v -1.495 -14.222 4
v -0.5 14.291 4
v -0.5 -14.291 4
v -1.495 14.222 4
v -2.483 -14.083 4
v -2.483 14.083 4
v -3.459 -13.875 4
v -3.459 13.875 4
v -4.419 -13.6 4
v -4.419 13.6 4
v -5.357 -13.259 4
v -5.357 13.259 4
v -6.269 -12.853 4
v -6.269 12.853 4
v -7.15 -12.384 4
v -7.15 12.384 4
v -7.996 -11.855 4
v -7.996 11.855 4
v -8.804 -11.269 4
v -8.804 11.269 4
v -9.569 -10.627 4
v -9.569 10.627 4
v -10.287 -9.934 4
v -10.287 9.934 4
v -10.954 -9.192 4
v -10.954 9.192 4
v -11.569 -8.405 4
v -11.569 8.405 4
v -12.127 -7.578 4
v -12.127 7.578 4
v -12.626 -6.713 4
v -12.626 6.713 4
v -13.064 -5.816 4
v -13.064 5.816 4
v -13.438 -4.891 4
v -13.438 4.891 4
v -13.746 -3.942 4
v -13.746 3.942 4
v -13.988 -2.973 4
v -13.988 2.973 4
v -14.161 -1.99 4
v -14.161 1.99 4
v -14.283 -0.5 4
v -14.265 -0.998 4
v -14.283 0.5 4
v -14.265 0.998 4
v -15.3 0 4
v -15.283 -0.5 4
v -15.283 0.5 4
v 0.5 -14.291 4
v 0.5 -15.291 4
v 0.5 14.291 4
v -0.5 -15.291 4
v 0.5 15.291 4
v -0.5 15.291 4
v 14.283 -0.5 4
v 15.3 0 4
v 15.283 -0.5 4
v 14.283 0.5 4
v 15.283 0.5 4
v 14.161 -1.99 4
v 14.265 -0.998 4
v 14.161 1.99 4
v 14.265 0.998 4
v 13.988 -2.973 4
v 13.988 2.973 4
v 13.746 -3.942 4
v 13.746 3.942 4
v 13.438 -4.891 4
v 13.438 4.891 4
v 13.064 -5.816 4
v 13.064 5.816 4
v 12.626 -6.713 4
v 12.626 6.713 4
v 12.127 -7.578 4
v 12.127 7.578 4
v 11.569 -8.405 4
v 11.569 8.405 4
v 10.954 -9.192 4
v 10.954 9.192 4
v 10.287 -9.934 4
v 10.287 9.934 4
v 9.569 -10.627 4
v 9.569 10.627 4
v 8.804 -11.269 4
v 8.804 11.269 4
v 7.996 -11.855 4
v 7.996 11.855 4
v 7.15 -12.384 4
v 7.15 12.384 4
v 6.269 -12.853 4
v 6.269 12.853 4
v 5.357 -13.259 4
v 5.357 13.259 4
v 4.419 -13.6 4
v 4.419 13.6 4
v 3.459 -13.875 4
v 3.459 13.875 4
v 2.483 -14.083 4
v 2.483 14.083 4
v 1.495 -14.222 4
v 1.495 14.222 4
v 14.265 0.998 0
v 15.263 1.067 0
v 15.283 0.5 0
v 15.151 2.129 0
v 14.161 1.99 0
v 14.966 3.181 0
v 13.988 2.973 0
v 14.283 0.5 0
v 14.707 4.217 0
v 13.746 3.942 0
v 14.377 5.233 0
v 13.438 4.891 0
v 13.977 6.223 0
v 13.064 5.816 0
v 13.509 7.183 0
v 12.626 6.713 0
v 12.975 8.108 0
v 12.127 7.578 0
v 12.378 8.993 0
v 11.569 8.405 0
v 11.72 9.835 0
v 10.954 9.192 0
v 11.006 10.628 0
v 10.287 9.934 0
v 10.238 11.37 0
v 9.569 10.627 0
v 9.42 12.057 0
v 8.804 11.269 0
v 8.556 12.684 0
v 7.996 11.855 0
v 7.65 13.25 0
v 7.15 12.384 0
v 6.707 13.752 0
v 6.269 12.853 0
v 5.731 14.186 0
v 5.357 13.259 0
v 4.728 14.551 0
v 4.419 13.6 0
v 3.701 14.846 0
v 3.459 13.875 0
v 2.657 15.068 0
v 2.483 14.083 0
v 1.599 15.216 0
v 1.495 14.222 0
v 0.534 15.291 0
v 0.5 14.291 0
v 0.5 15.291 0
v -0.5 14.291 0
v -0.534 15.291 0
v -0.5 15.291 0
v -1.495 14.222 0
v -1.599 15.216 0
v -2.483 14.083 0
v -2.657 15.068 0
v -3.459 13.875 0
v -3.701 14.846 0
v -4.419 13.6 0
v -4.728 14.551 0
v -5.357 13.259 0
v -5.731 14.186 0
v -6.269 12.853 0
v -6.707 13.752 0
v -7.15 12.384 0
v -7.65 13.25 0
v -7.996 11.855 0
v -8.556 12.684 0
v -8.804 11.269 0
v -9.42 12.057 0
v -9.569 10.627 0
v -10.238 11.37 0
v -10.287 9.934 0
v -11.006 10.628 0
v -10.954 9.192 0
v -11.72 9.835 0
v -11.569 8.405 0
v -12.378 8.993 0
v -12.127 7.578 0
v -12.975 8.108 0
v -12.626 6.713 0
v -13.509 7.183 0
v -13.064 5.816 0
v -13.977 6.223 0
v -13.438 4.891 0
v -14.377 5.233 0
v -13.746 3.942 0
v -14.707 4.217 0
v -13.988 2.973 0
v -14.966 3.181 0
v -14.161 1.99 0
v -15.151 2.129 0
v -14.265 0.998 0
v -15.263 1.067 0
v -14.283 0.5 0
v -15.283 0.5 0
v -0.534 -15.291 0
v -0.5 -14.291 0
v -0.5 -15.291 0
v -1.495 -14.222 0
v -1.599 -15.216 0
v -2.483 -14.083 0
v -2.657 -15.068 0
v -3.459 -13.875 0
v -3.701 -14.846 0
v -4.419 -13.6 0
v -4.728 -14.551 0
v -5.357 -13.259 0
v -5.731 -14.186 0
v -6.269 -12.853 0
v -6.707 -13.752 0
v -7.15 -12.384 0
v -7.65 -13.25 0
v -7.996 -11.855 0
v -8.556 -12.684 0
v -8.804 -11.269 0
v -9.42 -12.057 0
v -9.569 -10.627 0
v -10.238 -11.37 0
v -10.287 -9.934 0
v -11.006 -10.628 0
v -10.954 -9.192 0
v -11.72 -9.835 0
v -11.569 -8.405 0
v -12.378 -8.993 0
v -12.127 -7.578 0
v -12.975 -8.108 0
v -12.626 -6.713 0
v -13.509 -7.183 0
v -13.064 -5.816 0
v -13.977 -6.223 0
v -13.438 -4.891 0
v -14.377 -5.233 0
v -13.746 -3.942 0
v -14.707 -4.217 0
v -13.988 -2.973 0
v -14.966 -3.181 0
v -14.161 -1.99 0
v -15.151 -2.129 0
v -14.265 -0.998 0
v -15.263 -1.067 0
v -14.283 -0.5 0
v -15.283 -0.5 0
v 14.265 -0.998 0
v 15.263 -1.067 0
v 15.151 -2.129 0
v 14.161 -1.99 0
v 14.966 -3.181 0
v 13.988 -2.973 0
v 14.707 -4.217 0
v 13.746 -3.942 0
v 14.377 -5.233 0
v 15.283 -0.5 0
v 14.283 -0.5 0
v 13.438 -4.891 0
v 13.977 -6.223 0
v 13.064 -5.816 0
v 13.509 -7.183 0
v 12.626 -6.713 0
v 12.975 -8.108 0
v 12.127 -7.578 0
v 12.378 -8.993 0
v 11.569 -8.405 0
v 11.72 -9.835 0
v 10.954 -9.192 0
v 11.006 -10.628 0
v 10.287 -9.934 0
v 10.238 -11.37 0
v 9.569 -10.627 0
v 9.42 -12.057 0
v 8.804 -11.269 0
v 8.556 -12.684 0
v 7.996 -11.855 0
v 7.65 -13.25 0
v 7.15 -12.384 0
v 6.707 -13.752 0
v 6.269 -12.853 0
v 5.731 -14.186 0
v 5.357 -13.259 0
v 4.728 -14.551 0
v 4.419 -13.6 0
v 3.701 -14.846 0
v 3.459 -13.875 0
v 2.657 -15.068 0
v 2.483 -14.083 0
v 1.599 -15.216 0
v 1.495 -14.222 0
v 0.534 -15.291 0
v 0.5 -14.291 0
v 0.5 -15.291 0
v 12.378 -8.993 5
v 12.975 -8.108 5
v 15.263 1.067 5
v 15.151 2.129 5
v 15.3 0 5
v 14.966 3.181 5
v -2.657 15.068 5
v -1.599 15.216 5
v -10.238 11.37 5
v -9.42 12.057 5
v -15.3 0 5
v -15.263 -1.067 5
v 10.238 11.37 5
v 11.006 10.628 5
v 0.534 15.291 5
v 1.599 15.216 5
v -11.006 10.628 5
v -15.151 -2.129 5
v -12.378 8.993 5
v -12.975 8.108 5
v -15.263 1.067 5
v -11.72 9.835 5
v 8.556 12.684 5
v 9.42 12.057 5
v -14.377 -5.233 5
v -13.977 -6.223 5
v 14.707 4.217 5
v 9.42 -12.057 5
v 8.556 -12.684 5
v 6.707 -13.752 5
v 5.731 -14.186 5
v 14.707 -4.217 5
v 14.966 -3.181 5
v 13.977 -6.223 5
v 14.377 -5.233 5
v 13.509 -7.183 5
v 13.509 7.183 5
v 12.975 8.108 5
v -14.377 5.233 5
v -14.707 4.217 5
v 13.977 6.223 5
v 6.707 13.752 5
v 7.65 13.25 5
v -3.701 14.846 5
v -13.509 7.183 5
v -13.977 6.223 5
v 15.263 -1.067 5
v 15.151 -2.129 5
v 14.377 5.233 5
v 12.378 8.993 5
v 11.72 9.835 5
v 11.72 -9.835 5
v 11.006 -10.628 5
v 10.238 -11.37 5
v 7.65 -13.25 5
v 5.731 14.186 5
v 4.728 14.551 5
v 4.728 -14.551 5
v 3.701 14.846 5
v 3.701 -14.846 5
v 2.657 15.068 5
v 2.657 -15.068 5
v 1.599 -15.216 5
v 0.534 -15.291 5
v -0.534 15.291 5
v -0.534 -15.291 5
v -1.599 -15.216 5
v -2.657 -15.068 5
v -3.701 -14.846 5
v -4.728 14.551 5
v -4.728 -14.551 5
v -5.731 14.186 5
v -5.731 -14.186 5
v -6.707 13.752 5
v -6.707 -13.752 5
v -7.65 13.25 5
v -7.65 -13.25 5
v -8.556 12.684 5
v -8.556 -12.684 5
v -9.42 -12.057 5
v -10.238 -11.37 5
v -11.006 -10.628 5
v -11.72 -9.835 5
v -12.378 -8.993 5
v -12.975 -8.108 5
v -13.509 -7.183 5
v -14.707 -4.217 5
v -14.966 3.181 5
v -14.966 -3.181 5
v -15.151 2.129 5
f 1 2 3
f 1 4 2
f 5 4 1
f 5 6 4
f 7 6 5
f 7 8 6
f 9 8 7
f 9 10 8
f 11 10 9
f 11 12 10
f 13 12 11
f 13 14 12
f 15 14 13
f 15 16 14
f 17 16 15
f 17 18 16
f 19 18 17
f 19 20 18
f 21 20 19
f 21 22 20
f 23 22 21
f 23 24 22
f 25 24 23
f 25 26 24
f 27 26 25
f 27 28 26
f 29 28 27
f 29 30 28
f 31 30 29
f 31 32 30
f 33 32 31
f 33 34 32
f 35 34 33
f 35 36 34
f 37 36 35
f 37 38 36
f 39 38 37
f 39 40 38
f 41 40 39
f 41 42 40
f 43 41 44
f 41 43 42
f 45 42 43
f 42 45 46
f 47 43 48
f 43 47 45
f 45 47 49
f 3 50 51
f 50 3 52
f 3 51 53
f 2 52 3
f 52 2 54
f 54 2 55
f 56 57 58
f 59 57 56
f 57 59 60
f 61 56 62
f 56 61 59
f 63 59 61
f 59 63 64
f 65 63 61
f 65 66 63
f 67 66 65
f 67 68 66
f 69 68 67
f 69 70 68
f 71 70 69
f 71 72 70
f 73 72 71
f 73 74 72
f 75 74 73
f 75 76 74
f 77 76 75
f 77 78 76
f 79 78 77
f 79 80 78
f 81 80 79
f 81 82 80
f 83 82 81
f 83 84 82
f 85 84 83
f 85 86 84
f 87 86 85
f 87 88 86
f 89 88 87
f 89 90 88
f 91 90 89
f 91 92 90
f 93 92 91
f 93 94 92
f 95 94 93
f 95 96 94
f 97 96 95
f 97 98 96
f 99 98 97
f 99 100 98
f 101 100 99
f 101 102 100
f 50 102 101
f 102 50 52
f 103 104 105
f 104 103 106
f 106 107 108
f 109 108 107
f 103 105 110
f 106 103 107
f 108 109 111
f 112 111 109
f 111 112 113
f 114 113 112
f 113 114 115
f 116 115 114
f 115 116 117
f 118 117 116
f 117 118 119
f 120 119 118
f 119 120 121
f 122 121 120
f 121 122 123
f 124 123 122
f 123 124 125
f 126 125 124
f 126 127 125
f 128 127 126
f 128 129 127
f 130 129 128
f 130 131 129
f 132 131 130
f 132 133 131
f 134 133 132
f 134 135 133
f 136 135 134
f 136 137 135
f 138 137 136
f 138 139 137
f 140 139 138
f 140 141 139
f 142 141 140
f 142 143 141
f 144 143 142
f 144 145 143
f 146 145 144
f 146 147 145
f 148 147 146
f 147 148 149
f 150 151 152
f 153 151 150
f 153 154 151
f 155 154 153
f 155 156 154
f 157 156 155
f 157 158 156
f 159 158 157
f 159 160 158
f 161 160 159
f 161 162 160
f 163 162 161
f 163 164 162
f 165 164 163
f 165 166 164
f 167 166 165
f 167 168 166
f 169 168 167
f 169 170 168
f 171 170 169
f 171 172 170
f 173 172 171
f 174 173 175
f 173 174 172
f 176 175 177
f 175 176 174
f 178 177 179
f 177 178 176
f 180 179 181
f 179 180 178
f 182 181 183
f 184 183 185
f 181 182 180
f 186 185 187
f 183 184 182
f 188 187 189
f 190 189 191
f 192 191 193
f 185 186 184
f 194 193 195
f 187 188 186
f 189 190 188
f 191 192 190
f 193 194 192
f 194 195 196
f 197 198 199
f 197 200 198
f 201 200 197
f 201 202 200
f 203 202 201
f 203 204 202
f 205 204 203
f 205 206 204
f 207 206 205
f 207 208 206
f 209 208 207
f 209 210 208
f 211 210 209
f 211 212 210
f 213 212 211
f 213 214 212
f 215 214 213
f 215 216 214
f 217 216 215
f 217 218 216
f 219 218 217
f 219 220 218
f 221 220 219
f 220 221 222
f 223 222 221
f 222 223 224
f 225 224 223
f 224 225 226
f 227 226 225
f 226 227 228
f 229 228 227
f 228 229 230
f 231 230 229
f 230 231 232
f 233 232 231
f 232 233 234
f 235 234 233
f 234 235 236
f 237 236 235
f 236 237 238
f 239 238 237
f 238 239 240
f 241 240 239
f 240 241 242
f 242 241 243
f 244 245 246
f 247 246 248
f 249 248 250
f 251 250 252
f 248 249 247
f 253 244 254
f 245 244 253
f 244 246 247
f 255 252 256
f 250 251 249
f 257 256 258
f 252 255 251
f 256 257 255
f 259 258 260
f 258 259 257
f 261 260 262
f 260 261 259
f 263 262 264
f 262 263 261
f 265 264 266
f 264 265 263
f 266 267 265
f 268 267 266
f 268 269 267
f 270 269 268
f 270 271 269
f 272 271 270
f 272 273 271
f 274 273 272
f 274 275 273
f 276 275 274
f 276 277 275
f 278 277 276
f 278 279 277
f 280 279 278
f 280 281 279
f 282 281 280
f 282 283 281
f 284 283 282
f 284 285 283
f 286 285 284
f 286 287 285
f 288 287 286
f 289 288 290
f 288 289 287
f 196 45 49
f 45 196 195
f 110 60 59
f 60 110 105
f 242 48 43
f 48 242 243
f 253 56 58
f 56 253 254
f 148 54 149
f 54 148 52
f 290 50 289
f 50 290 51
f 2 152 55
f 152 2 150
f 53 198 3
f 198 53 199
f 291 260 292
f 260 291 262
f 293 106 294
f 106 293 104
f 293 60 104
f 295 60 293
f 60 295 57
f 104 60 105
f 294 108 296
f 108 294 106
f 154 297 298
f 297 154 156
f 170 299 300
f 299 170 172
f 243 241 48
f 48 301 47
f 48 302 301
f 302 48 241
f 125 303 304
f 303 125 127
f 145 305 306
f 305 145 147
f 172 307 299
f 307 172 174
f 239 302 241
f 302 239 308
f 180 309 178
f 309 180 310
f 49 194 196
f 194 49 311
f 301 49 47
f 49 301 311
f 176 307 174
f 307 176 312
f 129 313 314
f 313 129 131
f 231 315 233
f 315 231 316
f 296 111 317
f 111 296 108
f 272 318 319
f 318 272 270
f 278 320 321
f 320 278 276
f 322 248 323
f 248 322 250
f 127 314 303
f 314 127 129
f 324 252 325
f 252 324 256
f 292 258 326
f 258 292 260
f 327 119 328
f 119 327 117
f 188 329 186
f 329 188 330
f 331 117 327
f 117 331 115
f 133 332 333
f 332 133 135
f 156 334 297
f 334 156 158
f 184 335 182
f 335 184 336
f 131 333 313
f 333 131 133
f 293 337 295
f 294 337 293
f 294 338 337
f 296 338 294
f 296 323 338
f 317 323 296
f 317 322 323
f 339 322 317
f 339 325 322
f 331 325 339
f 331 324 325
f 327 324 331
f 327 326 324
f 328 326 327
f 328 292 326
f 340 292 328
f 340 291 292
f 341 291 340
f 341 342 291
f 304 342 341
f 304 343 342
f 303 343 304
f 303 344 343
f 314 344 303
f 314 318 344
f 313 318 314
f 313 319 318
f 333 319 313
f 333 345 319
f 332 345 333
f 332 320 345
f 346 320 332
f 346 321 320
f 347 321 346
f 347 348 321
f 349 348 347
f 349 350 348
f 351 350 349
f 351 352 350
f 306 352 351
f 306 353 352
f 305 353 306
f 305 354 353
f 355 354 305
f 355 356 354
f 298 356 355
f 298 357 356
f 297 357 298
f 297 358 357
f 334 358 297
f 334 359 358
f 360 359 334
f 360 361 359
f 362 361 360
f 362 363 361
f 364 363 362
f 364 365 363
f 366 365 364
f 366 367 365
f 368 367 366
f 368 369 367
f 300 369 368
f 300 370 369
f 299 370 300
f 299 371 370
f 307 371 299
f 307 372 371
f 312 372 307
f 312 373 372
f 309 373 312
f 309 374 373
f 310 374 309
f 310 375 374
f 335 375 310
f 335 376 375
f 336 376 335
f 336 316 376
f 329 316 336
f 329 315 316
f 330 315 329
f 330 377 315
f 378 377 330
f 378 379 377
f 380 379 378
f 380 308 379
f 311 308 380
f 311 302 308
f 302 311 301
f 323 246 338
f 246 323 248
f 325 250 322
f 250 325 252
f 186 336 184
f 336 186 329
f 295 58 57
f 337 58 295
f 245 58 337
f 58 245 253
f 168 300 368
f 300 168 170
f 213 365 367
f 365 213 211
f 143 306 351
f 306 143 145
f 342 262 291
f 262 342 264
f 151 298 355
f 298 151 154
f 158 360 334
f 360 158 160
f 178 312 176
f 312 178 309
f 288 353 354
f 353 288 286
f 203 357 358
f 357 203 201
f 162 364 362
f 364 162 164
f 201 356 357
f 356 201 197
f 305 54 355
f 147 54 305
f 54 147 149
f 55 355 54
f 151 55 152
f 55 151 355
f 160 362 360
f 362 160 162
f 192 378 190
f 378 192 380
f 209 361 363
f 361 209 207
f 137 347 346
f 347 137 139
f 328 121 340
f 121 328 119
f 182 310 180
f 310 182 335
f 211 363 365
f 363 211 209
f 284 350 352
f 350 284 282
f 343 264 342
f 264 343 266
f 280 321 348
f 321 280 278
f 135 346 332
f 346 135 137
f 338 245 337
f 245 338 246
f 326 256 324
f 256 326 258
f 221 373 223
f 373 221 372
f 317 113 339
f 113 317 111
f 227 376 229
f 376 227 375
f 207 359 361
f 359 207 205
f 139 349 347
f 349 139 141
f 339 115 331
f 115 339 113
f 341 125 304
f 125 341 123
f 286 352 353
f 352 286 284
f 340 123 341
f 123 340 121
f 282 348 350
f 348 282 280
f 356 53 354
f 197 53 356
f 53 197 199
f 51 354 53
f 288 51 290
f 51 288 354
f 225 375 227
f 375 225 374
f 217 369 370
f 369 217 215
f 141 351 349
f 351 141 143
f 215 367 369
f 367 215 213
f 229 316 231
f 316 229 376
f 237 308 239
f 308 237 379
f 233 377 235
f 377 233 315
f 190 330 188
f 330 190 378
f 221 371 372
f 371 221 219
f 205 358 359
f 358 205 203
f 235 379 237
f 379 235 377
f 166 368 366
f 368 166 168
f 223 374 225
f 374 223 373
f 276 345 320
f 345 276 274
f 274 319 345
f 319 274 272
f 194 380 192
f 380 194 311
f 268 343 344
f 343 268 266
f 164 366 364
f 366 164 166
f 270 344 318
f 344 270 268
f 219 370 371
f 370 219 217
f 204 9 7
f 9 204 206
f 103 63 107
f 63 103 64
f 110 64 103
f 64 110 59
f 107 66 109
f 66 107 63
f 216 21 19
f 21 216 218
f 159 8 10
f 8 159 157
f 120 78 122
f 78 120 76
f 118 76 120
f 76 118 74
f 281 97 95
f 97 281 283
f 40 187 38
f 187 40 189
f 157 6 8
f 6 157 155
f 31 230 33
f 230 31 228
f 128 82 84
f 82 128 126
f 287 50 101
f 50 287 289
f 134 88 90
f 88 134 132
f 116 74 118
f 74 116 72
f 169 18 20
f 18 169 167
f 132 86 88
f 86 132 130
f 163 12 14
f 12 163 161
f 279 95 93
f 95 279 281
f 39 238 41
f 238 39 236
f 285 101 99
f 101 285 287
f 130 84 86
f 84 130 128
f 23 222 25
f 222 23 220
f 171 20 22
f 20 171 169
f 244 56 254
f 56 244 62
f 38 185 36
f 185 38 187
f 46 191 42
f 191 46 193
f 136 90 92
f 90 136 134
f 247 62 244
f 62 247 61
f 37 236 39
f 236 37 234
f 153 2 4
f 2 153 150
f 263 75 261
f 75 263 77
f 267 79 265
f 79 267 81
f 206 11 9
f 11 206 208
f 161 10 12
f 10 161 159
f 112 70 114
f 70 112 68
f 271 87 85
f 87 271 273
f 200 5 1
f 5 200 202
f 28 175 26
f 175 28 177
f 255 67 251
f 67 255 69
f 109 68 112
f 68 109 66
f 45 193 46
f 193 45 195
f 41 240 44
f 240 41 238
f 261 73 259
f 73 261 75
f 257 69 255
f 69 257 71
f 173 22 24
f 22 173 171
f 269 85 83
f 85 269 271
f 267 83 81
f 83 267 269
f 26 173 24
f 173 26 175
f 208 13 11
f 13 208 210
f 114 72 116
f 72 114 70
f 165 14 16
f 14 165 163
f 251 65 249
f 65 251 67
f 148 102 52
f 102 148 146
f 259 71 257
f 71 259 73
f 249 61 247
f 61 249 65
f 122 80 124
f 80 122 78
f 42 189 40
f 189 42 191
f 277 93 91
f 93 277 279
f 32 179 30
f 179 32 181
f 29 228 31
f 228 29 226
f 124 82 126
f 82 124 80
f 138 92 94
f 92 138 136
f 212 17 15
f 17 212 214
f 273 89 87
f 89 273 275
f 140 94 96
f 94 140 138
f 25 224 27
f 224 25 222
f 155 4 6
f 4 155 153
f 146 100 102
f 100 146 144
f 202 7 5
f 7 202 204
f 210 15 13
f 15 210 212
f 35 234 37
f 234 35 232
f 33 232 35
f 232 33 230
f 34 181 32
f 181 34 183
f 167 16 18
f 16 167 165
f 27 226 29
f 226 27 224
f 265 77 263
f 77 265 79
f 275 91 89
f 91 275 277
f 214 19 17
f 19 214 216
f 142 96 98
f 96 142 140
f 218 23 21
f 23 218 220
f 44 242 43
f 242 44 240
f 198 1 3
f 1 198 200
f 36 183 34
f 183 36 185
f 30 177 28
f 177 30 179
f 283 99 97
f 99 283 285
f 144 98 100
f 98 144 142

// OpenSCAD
$fn = 90;
wallThickness = 1;
innerDiameter = 28.6;
outterDiameter = innerDiameter+2*wallThickness;
outterHeight = 5;
innerHeight = outterHeight-wallThickness;

difference(){
	cylinder(d=outterDiameter, outterHeight);
	#cylinder(d=innerDiameter, innerHeight);
	translate([0, 0, innerHeight/2]){
		#cube([outterDiameter, 1, innerHeight], center=true);
		#cube([1, outterDiameter, innerHeight], center=true);
	}
}

translate([0, 0, innerHeight]){
	difference(){
		scalingFactor = 0.07;
		scale([scalingFactor, scalingFactor, scalingFactor])
			surface("image.png", invert=true, center=true);
		cubeSideLength = 40;
		translate([0, 0, -cubeSideLength/2-2])
			cube([cubeSideLength, cubeSideLength, cubeSideLength], center=true);
	}
}
